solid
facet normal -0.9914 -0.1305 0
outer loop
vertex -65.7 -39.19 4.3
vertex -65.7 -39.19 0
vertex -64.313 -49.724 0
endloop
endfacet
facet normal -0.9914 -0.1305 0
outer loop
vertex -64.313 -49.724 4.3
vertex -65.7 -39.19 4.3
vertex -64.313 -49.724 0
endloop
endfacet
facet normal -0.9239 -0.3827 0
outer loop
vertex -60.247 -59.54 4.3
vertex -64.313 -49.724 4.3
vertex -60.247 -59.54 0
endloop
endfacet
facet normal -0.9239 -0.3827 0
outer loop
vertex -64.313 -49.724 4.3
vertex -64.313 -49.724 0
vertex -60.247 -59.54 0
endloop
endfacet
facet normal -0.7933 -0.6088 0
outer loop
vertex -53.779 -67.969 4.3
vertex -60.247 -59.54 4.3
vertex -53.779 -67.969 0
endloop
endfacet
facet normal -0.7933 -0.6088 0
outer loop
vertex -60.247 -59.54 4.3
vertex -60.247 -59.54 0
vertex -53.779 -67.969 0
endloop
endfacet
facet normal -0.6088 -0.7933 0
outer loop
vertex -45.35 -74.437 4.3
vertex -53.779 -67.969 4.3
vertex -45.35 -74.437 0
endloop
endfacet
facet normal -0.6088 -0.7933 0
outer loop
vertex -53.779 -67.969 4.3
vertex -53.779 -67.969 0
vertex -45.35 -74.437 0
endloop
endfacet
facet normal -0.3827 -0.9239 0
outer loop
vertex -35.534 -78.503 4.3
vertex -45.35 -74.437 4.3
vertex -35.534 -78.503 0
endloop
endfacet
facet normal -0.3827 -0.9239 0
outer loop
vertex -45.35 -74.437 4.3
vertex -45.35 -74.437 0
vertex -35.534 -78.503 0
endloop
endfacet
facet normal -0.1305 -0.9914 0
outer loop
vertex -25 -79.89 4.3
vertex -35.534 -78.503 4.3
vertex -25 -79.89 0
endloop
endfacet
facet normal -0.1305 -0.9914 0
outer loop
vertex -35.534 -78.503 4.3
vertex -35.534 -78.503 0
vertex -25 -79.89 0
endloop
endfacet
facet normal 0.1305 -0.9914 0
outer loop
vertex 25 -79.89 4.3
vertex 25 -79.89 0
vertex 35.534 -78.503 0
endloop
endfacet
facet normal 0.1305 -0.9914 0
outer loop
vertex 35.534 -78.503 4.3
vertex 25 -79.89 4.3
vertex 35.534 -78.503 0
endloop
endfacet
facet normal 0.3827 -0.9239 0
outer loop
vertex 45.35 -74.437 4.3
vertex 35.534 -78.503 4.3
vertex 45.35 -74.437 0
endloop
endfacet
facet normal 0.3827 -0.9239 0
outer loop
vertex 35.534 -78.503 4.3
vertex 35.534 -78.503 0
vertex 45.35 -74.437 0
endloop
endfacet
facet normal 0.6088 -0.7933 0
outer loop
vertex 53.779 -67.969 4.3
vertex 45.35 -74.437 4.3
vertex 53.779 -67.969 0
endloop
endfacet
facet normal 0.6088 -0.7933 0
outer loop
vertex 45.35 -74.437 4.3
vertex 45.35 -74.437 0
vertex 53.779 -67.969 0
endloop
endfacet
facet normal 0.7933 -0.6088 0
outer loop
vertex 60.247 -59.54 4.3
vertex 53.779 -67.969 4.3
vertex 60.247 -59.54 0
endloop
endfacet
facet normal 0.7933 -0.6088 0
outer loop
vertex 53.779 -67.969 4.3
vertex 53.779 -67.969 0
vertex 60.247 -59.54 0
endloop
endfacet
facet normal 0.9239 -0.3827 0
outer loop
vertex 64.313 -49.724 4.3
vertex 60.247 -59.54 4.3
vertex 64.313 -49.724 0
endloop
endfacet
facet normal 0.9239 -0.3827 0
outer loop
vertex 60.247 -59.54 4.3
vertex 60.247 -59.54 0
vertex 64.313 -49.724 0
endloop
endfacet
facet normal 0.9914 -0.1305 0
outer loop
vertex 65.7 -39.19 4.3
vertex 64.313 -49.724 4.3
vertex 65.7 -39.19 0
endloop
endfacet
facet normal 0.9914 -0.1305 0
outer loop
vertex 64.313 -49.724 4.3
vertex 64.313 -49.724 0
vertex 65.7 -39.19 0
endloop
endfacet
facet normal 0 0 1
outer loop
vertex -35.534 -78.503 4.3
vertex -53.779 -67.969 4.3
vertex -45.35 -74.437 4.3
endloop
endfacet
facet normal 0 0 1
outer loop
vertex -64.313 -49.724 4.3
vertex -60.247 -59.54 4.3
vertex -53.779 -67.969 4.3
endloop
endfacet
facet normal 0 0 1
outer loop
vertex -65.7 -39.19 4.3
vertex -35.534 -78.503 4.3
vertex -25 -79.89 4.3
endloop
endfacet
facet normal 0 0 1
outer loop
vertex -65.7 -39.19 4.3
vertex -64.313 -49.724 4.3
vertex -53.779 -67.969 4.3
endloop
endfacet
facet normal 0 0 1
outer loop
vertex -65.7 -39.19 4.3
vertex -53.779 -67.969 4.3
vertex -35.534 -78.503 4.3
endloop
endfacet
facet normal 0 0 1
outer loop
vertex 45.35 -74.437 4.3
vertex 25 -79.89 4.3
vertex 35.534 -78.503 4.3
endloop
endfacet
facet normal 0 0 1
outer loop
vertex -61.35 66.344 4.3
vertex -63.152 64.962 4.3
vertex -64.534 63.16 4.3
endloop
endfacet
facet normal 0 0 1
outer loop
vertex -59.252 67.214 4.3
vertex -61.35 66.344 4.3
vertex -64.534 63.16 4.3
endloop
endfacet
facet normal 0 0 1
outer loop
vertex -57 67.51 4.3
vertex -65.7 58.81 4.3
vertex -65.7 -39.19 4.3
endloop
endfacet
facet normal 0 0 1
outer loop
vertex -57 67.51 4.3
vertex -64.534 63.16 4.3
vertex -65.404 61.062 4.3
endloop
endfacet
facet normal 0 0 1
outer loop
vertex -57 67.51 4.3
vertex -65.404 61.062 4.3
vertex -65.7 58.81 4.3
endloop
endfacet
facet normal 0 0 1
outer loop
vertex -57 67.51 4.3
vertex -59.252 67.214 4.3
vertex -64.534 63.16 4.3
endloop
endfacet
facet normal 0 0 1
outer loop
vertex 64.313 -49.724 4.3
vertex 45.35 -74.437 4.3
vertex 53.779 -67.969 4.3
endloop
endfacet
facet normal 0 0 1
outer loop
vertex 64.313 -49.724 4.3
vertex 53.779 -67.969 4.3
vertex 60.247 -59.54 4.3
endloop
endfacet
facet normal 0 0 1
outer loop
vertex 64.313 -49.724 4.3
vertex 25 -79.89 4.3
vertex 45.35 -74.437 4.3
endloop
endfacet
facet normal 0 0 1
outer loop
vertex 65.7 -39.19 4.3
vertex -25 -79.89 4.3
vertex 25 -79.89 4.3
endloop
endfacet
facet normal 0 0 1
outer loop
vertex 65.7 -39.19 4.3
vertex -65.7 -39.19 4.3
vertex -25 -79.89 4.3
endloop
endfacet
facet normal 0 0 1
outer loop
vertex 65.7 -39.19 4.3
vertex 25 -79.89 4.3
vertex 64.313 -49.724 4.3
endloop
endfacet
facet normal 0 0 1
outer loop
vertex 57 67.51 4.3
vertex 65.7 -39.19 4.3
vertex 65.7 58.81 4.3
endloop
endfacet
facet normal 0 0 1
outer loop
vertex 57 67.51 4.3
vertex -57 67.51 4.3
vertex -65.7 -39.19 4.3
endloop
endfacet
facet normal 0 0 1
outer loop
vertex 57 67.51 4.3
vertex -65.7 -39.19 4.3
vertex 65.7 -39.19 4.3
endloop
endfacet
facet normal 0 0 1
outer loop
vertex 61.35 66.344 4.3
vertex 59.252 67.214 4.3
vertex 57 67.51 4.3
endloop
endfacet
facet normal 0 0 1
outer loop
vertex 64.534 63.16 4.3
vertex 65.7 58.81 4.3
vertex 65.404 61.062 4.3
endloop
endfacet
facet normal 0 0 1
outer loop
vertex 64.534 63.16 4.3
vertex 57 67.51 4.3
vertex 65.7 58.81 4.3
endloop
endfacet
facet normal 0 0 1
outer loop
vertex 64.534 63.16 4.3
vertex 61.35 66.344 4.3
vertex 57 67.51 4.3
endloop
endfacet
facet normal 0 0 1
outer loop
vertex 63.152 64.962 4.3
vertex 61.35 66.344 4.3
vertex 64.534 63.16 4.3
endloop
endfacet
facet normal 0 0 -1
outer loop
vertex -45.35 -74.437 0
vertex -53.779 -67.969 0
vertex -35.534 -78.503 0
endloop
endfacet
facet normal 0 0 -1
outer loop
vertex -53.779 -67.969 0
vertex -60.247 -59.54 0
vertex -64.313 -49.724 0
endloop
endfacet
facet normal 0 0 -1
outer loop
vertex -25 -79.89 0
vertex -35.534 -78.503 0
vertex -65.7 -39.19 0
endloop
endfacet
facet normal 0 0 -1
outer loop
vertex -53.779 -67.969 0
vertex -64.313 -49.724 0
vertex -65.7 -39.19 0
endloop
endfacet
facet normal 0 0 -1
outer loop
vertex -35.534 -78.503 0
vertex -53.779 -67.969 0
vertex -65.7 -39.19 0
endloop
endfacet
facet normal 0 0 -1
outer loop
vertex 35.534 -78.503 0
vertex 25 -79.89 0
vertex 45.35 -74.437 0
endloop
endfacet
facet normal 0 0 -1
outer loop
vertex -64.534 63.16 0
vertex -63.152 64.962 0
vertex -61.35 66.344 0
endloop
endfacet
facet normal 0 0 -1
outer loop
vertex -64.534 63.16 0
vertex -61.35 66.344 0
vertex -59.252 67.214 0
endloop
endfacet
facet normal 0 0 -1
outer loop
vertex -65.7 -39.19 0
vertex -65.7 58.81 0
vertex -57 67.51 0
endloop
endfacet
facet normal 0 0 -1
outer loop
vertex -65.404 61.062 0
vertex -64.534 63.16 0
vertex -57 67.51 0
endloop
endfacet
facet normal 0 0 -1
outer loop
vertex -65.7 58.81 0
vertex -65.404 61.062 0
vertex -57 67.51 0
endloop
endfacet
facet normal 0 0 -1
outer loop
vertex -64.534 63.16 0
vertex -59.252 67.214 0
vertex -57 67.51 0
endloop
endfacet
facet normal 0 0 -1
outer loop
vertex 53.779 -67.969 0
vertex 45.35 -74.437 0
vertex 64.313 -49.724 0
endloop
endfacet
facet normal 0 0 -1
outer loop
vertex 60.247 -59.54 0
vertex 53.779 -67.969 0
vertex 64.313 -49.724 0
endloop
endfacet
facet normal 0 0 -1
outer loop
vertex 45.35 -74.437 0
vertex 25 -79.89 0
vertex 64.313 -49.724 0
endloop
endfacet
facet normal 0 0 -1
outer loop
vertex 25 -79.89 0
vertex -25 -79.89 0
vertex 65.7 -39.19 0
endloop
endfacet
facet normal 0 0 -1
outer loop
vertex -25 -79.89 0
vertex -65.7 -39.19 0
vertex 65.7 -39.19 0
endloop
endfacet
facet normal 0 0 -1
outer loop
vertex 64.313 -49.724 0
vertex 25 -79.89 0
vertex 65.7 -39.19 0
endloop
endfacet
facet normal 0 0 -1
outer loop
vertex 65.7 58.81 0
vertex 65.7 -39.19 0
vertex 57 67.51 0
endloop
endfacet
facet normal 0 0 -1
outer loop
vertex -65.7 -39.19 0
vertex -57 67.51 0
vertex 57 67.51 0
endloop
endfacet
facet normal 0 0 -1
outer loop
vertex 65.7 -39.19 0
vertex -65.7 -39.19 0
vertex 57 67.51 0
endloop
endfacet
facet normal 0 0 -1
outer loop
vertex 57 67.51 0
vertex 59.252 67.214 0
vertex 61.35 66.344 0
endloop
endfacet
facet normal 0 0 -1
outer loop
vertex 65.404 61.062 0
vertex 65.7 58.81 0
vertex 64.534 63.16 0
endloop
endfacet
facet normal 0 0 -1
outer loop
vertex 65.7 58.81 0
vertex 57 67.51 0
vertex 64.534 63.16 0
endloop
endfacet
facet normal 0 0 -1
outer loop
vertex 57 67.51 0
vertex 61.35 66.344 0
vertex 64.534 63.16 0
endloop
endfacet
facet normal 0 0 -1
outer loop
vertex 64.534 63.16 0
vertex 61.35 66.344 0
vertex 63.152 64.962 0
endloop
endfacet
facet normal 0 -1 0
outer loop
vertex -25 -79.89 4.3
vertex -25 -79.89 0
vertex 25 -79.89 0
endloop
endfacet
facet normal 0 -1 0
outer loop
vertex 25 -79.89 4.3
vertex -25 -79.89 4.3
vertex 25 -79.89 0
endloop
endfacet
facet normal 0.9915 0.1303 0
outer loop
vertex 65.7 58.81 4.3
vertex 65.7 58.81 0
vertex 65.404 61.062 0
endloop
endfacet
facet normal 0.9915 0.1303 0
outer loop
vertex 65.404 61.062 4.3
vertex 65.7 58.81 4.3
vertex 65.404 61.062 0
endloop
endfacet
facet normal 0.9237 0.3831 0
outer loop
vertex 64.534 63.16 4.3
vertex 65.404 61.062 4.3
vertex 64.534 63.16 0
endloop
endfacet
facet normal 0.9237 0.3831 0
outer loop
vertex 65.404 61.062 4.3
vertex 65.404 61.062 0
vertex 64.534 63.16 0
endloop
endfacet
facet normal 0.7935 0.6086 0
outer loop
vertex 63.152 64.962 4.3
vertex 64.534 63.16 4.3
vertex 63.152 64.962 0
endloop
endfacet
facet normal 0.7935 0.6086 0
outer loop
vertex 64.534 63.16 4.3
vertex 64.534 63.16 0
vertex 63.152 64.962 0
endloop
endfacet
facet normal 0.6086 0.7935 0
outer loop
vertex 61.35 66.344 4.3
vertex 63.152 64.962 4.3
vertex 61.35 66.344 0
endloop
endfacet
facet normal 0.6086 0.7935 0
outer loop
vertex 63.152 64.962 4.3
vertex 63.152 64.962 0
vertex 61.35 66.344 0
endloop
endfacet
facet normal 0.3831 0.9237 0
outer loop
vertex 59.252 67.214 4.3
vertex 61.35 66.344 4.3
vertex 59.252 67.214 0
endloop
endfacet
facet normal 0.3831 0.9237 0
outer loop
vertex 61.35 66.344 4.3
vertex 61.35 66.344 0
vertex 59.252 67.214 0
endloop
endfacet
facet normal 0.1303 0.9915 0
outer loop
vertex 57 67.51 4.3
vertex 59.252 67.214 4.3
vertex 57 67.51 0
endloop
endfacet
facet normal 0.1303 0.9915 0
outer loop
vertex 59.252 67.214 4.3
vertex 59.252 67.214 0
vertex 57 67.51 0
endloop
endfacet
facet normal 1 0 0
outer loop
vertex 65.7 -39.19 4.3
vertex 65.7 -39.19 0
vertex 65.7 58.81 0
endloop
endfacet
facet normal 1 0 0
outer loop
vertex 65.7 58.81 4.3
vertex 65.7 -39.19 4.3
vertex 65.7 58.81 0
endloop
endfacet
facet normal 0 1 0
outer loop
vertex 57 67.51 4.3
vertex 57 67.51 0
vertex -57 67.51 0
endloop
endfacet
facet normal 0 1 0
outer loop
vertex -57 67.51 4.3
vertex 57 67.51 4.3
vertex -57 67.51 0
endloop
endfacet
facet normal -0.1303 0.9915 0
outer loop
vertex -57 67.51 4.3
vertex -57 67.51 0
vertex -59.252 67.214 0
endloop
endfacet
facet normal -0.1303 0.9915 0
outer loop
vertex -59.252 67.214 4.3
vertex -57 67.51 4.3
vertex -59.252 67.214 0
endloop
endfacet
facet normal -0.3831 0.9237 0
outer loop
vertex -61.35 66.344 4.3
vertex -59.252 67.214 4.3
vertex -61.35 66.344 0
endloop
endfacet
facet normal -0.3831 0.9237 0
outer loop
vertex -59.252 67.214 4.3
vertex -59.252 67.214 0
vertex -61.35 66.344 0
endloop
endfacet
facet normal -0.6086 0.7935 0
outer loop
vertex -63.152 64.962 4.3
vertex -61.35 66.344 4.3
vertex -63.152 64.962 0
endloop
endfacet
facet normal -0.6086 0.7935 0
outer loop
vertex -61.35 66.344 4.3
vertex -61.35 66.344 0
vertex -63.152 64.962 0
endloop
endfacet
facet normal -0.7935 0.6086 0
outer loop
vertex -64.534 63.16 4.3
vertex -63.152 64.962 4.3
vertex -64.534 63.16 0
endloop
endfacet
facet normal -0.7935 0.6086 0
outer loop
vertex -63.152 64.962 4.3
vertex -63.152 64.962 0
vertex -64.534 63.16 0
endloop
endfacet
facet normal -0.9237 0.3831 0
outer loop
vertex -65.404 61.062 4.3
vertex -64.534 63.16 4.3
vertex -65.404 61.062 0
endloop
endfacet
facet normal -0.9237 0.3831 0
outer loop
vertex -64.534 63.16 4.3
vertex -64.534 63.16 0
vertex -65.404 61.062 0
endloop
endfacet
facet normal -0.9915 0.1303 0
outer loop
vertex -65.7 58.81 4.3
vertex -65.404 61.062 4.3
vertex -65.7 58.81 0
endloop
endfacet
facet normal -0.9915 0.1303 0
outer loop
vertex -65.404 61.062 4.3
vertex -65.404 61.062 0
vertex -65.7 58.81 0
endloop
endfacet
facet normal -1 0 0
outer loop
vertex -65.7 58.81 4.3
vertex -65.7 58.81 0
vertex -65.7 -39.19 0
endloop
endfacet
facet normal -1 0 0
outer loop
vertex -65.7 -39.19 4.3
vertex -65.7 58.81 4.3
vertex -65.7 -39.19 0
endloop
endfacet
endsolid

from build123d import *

# Parameters (mm, degrees)
BOSS_EXTRUDE1_DEPTH = 4.3


with BuildPart() as part:
    # Sketch1 → Boss-Extrude1 (new body)
    with BuildSketch(Plane.XY):
        with BuildLine():
            Line((-65.7, 58.81), (-65.7, -39.19))
            ThreePointArc((-65.7, -39.19), (-53.779245994, -67.969245994), (-25, -79.89))
            Line((-25, -79.89), (-0.5, -79.89))
            Line((-0.5, -79.89), (0.5, -79.89))
            Line((0.5, -79.89), (25, -79.89))
            ThreePointArc((25, -79.89), (53.779245994, -67.969245994), (65.7, -39.19))
            Line((65.7, -39.19), (65.7, 58.81))
            ThreePointArc((65.7, 58.81), (63.151828996, 64.961828996), (57, 67.51))
            Line((57, 67.51), (-57, 67.51))
            ThreePointArc((-57, 67.51), (-63.151828996, 64.961828996), (-65.7, 58.81))
        make_face()
    extrude(amount=BOSS_EXTRUDE1_DEPTH)


solid = part.part
